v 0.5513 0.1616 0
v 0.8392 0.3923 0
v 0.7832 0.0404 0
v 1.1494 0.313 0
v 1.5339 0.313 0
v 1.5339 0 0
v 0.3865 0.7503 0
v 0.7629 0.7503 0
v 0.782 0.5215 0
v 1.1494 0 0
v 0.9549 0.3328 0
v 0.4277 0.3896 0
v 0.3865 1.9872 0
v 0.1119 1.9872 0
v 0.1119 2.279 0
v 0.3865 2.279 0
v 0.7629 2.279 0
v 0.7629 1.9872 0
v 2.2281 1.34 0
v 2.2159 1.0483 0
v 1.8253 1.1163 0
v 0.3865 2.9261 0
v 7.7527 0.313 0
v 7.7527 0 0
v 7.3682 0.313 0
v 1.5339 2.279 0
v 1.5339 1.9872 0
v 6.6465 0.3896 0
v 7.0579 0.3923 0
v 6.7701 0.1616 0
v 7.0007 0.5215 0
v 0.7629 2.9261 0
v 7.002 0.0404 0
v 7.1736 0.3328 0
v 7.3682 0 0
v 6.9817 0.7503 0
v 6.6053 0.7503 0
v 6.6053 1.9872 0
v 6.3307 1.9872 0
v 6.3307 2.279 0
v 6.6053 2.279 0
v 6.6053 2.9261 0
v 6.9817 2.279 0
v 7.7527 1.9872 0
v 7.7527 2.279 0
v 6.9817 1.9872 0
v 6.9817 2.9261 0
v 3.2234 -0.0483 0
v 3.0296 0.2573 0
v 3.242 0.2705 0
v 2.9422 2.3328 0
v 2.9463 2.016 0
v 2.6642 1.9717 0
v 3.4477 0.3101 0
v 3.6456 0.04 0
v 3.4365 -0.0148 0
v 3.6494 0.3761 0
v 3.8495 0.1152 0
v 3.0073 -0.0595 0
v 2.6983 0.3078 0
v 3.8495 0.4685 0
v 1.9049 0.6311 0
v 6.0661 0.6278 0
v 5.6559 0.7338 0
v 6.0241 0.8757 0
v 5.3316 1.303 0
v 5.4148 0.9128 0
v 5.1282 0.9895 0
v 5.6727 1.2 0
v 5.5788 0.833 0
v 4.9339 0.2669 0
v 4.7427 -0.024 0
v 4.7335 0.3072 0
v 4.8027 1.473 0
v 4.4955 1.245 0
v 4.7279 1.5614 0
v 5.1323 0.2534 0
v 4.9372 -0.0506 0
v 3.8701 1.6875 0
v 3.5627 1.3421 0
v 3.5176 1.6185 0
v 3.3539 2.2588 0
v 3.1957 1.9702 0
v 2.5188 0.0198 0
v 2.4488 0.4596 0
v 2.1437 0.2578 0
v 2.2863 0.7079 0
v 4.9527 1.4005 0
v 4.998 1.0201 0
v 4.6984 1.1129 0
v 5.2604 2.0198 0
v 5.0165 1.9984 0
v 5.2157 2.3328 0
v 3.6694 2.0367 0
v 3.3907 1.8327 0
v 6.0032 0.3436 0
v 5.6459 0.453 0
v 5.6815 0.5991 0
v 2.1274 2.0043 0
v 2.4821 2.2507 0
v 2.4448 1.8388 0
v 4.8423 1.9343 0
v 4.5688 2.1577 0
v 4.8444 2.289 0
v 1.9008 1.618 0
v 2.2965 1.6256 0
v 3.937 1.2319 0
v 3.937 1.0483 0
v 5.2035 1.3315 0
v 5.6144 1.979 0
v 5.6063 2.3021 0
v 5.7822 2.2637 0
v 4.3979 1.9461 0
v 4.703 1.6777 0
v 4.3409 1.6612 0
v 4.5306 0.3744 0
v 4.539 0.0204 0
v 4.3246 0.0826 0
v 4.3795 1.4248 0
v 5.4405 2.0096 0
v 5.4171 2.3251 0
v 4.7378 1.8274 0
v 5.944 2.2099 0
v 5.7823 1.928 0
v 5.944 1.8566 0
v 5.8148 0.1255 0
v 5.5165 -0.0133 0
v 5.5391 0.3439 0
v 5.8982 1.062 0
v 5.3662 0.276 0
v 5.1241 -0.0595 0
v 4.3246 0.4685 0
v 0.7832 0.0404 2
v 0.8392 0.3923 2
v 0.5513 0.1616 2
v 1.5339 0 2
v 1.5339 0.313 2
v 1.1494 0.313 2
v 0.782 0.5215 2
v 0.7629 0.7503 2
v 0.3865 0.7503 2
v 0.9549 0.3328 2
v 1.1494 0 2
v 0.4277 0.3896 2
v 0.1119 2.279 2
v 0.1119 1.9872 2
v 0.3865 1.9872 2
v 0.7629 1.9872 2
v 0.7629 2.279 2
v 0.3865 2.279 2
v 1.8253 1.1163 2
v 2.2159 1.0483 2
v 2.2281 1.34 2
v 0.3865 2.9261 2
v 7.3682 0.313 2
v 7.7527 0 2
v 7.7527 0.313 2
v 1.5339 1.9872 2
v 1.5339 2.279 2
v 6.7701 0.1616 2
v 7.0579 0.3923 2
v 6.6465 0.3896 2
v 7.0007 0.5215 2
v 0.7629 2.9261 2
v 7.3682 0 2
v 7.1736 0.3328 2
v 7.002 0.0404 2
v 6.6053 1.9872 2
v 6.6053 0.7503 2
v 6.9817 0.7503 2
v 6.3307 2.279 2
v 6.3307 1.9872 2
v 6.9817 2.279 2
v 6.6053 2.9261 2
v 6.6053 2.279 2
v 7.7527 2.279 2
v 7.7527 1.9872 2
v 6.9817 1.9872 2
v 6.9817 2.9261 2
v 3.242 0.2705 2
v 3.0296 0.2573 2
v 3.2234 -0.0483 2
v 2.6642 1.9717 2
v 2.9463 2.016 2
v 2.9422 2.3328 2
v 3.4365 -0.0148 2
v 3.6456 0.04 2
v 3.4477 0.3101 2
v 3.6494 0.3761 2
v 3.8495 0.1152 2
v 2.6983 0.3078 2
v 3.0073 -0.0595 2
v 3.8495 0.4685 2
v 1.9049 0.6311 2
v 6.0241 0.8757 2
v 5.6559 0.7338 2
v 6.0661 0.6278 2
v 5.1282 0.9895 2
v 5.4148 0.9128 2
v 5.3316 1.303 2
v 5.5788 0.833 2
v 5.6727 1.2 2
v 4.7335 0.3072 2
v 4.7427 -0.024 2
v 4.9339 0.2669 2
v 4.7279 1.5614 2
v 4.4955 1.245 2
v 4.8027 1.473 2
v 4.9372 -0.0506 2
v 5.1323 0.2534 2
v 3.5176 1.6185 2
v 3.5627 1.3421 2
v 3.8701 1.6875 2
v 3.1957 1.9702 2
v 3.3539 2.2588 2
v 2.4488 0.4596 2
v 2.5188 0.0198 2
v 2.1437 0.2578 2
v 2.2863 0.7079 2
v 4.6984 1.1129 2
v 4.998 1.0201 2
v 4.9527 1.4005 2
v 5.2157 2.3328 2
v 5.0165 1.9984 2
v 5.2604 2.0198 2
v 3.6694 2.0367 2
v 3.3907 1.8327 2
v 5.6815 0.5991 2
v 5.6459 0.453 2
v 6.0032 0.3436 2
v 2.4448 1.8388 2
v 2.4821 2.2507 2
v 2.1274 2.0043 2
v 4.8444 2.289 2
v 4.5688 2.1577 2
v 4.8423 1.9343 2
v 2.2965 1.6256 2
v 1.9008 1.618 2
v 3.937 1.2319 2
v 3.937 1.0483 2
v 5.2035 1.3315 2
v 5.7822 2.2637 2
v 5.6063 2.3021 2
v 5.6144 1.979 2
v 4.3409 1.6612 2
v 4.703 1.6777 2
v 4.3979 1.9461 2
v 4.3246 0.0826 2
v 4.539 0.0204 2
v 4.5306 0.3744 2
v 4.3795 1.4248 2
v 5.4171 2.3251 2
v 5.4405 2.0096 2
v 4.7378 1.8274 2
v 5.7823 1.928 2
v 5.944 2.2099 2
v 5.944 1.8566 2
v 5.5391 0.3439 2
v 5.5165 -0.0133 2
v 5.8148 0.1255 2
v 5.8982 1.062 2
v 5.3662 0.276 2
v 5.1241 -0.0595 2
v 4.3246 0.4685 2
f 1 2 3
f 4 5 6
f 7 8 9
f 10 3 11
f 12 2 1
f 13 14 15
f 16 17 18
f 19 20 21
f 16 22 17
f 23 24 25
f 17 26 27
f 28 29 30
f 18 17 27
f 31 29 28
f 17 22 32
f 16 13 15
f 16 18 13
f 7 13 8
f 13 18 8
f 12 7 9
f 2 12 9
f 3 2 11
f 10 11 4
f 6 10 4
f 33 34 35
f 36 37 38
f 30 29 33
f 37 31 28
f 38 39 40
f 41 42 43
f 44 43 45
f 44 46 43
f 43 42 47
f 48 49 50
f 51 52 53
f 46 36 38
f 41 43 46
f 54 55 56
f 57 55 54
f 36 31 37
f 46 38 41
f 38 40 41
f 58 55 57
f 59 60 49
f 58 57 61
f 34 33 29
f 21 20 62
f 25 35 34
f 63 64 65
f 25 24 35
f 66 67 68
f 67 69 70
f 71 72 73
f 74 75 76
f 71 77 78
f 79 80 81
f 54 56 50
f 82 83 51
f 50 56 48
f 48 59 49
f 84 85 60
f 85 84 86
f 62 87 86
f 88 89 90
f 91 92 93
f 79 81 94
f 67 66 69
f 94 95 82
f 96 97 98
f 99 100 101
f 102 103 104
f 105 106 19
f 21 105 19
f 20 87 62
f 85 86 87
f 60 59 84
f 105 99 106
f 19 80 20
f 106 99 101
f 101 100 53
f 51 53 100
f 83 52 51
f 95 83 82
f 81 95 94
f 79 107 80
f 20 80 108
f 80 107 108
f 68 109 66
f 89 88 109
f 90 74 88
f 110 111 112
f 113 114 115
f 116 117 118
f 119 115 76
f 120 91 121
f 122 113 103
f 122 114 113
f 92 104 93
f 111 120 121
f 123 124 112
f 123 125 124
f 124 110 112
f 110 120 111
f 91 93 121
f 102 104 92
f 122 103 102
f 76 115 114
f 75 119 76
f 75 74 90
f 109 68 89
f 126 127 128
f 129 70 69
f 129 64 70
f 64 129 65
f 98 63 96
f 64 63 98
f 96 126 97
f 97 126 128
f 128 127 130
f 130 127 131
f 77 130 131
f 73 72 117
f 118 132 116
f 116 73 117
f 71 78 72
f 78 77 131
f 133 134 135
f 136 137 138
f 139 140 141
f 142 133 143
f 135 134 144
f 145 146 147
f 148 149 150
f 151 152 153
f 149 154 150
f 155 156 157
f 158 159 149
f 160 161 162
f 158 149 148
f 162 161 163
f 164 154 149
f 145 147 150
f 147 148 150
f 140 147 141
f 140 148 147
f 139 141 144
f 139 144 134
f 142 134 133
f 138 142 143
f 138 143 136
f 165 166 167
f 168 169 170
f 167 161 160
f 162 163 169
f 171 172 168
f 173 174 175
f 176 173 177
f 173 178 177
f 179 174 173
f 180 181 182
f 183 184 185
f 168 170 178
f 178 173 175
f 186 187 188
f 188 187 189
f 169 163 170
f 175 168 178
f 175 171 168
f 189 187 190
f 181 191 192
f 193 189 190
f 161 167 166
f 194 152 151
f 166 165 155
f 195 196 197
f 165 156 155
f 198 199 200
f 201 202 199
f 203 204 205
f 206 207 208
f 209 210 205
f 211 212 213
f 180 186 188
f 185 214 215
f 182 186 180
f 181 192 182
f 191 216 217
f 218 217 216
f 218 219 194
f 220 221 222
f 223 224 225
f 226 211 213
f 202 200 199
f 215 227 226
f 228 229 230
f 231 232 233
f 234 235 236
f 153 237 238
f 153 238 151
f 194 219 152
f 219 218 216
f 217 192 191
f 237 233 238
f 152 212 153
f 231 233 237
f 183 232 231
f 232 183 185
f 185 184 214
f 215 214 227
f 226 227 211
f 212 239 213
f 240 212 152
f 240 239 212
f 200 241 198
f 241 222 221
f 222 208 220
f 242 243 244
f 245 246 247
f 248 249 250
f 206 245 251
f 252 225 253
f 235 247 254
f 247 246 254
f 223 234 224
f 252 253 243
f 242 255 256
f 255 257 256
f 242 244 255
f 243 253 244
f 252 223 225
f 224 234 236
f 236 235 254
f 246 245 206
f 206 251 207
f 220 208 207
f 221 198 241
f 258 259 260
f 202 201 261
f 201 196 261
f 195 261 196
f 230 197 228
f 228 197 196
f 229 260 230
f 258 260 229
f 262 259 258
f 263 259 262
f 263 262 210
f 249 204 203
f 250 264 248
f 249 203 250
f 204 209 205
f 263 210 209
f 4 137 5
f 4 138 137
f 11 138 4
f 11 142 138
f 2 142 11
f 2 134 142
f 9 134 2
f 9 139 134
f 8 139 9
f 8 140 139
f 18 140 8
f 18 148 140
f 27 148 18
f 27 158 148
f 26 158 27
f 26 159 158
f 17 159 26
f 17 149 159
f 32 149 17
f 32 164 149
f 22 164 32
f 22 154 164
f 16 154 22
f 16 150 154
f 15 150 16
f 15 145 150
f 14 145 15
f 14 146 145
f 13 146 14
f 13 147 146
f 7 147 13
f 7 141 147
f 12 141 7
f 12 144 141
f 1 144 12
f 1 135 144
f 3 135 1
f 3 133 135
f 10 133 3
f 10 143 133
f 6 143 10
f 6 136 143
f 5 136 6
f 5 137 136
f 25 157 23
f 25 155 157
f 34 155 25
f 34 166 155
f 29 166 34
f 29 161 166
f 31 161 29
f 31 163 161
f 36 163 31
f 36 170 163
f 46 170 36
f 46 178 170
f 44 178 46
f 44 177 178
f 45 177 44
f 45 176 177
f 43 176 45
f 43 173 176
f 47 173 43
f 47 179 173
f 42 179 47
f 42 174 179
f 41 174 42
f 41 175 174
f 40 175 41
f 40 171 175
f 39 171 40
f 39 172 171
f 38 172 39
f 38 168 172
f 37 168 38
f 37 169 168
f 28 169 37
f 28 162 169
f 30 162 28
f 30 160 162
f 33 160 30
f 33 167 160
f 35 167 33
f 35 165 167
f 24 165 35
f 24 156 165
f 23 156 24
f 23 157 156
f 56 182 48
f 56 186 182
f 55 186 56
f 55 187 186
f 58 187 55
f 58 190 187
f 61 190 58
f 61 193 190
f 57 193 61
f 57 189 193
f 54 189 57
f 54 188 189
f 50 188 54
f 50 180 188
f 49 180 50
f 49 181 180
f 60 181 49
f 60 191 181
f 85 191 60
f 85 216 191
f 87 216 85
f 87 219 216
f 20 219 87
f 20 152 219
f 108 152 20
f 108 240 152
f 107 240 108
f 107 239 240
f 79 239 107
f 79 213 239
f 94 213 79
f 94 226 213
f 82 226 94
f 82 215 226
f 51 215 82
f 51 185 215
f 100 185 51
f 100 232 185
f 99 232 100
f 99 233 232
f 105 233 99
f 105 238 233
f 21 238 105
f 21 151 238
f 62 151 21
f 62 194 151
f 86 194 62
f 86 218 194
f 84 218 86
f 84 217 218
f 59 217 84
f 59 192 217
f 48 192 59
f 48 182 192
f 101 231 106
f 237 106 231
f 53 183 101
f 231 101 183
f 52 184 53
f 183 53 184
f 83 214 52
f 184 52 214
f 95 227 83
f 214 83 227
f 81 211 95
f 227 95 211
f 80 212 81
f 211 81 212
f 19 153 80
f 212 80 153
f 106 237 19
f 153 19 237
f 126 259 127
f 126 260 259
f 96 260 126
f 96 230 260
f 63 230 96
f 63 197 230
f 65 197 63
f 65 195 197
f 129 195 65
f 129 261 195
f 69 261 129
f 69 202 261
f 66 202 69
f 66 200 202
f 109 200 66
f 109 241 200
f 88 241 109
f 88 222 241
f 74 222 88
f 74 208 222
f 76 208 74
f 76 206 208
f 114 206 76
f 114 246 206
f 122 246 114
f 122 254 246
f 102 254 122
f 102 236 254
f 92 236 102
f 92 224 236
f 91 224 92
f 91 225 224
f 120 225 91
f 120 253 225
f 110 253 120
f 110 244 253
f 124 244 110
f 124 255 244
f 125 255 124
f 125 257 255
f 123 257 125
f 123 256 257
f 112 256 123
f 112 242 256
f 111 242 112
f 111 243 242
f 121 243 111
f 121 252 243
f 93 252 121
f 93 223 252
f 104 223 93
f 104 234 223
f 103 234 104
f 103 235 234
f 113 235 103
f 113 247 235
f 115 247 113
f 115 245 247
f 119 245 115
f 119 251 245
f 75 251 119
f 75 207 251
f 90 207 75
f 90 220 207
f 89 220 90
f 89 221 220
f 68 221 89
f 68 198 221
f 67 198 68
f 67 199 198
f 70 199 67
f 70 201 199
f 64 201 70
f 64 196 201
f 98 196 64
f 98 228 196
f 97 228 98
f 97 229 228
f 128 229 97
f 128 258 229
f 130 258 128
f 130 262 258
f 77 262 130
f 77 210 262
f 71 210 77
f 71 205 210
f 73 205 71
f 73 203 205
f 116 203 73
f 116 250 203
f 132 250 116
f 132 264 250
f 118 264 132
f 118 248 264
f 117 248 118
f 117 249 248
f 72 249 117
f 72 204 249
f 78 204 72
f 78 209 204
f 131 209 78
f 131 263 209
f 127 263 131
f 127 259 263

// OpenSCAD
texte_a_inserer = "test"; 
taille = 3; 
police = "Courgette"; //[[Abril Fatface,Aclonica,Acme,Advent Pro,Akronim,Aladin,Alegreya,Alegreya Sans,Alegreya SC,Alex Brush,Alfa Slab One,Alice,Amaranth,Architects Daughter,Archivo Black,Archivo Narrow,Arimo,Arvo,Asap,Astloch,Asul,Averia Libre,Averia Serif Libre,Bangers,Basic,Belgrano,Berkshire Swash,Bigshot One,Bilbo Swash Caps,Black Ops One,Bonbon,Bowlby One SC,Brawler,Bubblegum Sans,Butterfly Kids,Cabin Condensed,Caesar Dressing,Cagliostro,Calligraffitti,Capriola,Carter One,Changa One,Chango,Chelsea Market,Cherry Cream Soda,Chewy,Chicle,Chivo,Clicker Script,Coming Soon,Concert One,Condiment,Cookie,Courgette,Covered By Your Grace,Crimson Text,Dancing Script,DejaVu Sans,DejaVu Serif,Dhurjati,Doppio One,Dosis,Droid Sans,Eagle Lake,Electrolize,Emilys Candy,Encode Sans,Encode Sans Compressed,Euphoria Script,Exo,Exo 2,Faster One,Federo,Finger Paint,Fjord One,Fontdiner Swanky,Freckle Face,Fruktur,Gabriela,Geo,Germania One,Give You Glory,Gloria Hallelujah,Goudy Bookletter 1911,Graduate,Grand Hotel,Great Vibes,Griffy,Hanalei Fill,Happy Monkey,Henny Penny,Hind,IM Fell English SC,Indie Flower,Irish Grover,Italianno,Jacques Francois Shadow,Jolly Lodger,Josefin Slab,Joti One,Judson,Just Another Hand,Kalam,Kameron,Karma,Kavoon,Knewave,Kranky,Kristi,Laila,Lakki Reddy,Lancelot,Lato,Leckerli One,Ledger,Lekton,Lemon One,Liberation Sans,Libre Caslon Text,Life Savers,Lilita One,Lily Script One,Limelight,Lobster,Lobster Two,Londrina Outline,Londrina Shadow,Londrina Solid,Lora,Love Ya Like A Sister,Loved by the King,Lovers Quarrel,Luckiest Guy,Lusitana,Macondo,Macondo Swash Caps,Mako,Marck Script,Margarine,Marko One,Maven Pro,McLaren,MedievalSharp,Merienda One,Merriweather,Mervale Script,Metal Mania,Metrophobic,Milonga,Miltonian Tattoo,Miss Fajardose,Molle,Montez,Montserrat,Mr De Haviland,Mystery Quest,Neucha,New Rocker,Niconne,Nosifer,Nothing You Could Do,Noto Sans Oriya,Noto Serif,Nova Square,Nunito,Old Standard TT,Oleo Script,Oleo Script Swash Caps,Orbitron,Oregano,Orienta,Original Surfer,Oswald,Over the Rainbow,Overlock,Oxygen,Pacifico,Paprika,Parisienne,Patrick Hand SC,Paytone One,Peralta,Permanent Marker,Piedra,Pirata One,Play,Playball,Poetsen One,Poppins,Press Start 2P,Princess Sofia,PT Mono,Qwigley,Racing Sans One,Raleway,Rancho,Ranga,Ribeye,Roboto,Roboto Condensed,Roboto Slab,Rochester,Rock Salt,Rubik One,Sail,Salsa,Sansita One,Sarina,Satisfy,Schoolbell,Seaweed Script,Sevillana,Shadows Into Light,Shadows Into Light Two,Share,Six Caps,Skranji,Source Sans Pro,Spicy Rice,Stardos Stencil,Stoke,Syncopate,Teko,Terminal Dosis,The Girl Next Door,Tillana,Timmana,Titillium Web,Ubuntu,Ultra,Underdog,UnifrakturCook,UnifrakturMaguntia,Vampiro One,Vidaloka,Viga,Voces,Volkhov,Vollkorn,Voltaire,Waiting for the Sunrise,Wallpoet,Wellfleet,Wendy One,Yellowtail,Yesteryear,Zeyada]]
hauteur = 2; 
module rendu(){
linear_extrude(hauteur) text(texte_a_inserer,size = taille, font = police);
}
rendu();
 
